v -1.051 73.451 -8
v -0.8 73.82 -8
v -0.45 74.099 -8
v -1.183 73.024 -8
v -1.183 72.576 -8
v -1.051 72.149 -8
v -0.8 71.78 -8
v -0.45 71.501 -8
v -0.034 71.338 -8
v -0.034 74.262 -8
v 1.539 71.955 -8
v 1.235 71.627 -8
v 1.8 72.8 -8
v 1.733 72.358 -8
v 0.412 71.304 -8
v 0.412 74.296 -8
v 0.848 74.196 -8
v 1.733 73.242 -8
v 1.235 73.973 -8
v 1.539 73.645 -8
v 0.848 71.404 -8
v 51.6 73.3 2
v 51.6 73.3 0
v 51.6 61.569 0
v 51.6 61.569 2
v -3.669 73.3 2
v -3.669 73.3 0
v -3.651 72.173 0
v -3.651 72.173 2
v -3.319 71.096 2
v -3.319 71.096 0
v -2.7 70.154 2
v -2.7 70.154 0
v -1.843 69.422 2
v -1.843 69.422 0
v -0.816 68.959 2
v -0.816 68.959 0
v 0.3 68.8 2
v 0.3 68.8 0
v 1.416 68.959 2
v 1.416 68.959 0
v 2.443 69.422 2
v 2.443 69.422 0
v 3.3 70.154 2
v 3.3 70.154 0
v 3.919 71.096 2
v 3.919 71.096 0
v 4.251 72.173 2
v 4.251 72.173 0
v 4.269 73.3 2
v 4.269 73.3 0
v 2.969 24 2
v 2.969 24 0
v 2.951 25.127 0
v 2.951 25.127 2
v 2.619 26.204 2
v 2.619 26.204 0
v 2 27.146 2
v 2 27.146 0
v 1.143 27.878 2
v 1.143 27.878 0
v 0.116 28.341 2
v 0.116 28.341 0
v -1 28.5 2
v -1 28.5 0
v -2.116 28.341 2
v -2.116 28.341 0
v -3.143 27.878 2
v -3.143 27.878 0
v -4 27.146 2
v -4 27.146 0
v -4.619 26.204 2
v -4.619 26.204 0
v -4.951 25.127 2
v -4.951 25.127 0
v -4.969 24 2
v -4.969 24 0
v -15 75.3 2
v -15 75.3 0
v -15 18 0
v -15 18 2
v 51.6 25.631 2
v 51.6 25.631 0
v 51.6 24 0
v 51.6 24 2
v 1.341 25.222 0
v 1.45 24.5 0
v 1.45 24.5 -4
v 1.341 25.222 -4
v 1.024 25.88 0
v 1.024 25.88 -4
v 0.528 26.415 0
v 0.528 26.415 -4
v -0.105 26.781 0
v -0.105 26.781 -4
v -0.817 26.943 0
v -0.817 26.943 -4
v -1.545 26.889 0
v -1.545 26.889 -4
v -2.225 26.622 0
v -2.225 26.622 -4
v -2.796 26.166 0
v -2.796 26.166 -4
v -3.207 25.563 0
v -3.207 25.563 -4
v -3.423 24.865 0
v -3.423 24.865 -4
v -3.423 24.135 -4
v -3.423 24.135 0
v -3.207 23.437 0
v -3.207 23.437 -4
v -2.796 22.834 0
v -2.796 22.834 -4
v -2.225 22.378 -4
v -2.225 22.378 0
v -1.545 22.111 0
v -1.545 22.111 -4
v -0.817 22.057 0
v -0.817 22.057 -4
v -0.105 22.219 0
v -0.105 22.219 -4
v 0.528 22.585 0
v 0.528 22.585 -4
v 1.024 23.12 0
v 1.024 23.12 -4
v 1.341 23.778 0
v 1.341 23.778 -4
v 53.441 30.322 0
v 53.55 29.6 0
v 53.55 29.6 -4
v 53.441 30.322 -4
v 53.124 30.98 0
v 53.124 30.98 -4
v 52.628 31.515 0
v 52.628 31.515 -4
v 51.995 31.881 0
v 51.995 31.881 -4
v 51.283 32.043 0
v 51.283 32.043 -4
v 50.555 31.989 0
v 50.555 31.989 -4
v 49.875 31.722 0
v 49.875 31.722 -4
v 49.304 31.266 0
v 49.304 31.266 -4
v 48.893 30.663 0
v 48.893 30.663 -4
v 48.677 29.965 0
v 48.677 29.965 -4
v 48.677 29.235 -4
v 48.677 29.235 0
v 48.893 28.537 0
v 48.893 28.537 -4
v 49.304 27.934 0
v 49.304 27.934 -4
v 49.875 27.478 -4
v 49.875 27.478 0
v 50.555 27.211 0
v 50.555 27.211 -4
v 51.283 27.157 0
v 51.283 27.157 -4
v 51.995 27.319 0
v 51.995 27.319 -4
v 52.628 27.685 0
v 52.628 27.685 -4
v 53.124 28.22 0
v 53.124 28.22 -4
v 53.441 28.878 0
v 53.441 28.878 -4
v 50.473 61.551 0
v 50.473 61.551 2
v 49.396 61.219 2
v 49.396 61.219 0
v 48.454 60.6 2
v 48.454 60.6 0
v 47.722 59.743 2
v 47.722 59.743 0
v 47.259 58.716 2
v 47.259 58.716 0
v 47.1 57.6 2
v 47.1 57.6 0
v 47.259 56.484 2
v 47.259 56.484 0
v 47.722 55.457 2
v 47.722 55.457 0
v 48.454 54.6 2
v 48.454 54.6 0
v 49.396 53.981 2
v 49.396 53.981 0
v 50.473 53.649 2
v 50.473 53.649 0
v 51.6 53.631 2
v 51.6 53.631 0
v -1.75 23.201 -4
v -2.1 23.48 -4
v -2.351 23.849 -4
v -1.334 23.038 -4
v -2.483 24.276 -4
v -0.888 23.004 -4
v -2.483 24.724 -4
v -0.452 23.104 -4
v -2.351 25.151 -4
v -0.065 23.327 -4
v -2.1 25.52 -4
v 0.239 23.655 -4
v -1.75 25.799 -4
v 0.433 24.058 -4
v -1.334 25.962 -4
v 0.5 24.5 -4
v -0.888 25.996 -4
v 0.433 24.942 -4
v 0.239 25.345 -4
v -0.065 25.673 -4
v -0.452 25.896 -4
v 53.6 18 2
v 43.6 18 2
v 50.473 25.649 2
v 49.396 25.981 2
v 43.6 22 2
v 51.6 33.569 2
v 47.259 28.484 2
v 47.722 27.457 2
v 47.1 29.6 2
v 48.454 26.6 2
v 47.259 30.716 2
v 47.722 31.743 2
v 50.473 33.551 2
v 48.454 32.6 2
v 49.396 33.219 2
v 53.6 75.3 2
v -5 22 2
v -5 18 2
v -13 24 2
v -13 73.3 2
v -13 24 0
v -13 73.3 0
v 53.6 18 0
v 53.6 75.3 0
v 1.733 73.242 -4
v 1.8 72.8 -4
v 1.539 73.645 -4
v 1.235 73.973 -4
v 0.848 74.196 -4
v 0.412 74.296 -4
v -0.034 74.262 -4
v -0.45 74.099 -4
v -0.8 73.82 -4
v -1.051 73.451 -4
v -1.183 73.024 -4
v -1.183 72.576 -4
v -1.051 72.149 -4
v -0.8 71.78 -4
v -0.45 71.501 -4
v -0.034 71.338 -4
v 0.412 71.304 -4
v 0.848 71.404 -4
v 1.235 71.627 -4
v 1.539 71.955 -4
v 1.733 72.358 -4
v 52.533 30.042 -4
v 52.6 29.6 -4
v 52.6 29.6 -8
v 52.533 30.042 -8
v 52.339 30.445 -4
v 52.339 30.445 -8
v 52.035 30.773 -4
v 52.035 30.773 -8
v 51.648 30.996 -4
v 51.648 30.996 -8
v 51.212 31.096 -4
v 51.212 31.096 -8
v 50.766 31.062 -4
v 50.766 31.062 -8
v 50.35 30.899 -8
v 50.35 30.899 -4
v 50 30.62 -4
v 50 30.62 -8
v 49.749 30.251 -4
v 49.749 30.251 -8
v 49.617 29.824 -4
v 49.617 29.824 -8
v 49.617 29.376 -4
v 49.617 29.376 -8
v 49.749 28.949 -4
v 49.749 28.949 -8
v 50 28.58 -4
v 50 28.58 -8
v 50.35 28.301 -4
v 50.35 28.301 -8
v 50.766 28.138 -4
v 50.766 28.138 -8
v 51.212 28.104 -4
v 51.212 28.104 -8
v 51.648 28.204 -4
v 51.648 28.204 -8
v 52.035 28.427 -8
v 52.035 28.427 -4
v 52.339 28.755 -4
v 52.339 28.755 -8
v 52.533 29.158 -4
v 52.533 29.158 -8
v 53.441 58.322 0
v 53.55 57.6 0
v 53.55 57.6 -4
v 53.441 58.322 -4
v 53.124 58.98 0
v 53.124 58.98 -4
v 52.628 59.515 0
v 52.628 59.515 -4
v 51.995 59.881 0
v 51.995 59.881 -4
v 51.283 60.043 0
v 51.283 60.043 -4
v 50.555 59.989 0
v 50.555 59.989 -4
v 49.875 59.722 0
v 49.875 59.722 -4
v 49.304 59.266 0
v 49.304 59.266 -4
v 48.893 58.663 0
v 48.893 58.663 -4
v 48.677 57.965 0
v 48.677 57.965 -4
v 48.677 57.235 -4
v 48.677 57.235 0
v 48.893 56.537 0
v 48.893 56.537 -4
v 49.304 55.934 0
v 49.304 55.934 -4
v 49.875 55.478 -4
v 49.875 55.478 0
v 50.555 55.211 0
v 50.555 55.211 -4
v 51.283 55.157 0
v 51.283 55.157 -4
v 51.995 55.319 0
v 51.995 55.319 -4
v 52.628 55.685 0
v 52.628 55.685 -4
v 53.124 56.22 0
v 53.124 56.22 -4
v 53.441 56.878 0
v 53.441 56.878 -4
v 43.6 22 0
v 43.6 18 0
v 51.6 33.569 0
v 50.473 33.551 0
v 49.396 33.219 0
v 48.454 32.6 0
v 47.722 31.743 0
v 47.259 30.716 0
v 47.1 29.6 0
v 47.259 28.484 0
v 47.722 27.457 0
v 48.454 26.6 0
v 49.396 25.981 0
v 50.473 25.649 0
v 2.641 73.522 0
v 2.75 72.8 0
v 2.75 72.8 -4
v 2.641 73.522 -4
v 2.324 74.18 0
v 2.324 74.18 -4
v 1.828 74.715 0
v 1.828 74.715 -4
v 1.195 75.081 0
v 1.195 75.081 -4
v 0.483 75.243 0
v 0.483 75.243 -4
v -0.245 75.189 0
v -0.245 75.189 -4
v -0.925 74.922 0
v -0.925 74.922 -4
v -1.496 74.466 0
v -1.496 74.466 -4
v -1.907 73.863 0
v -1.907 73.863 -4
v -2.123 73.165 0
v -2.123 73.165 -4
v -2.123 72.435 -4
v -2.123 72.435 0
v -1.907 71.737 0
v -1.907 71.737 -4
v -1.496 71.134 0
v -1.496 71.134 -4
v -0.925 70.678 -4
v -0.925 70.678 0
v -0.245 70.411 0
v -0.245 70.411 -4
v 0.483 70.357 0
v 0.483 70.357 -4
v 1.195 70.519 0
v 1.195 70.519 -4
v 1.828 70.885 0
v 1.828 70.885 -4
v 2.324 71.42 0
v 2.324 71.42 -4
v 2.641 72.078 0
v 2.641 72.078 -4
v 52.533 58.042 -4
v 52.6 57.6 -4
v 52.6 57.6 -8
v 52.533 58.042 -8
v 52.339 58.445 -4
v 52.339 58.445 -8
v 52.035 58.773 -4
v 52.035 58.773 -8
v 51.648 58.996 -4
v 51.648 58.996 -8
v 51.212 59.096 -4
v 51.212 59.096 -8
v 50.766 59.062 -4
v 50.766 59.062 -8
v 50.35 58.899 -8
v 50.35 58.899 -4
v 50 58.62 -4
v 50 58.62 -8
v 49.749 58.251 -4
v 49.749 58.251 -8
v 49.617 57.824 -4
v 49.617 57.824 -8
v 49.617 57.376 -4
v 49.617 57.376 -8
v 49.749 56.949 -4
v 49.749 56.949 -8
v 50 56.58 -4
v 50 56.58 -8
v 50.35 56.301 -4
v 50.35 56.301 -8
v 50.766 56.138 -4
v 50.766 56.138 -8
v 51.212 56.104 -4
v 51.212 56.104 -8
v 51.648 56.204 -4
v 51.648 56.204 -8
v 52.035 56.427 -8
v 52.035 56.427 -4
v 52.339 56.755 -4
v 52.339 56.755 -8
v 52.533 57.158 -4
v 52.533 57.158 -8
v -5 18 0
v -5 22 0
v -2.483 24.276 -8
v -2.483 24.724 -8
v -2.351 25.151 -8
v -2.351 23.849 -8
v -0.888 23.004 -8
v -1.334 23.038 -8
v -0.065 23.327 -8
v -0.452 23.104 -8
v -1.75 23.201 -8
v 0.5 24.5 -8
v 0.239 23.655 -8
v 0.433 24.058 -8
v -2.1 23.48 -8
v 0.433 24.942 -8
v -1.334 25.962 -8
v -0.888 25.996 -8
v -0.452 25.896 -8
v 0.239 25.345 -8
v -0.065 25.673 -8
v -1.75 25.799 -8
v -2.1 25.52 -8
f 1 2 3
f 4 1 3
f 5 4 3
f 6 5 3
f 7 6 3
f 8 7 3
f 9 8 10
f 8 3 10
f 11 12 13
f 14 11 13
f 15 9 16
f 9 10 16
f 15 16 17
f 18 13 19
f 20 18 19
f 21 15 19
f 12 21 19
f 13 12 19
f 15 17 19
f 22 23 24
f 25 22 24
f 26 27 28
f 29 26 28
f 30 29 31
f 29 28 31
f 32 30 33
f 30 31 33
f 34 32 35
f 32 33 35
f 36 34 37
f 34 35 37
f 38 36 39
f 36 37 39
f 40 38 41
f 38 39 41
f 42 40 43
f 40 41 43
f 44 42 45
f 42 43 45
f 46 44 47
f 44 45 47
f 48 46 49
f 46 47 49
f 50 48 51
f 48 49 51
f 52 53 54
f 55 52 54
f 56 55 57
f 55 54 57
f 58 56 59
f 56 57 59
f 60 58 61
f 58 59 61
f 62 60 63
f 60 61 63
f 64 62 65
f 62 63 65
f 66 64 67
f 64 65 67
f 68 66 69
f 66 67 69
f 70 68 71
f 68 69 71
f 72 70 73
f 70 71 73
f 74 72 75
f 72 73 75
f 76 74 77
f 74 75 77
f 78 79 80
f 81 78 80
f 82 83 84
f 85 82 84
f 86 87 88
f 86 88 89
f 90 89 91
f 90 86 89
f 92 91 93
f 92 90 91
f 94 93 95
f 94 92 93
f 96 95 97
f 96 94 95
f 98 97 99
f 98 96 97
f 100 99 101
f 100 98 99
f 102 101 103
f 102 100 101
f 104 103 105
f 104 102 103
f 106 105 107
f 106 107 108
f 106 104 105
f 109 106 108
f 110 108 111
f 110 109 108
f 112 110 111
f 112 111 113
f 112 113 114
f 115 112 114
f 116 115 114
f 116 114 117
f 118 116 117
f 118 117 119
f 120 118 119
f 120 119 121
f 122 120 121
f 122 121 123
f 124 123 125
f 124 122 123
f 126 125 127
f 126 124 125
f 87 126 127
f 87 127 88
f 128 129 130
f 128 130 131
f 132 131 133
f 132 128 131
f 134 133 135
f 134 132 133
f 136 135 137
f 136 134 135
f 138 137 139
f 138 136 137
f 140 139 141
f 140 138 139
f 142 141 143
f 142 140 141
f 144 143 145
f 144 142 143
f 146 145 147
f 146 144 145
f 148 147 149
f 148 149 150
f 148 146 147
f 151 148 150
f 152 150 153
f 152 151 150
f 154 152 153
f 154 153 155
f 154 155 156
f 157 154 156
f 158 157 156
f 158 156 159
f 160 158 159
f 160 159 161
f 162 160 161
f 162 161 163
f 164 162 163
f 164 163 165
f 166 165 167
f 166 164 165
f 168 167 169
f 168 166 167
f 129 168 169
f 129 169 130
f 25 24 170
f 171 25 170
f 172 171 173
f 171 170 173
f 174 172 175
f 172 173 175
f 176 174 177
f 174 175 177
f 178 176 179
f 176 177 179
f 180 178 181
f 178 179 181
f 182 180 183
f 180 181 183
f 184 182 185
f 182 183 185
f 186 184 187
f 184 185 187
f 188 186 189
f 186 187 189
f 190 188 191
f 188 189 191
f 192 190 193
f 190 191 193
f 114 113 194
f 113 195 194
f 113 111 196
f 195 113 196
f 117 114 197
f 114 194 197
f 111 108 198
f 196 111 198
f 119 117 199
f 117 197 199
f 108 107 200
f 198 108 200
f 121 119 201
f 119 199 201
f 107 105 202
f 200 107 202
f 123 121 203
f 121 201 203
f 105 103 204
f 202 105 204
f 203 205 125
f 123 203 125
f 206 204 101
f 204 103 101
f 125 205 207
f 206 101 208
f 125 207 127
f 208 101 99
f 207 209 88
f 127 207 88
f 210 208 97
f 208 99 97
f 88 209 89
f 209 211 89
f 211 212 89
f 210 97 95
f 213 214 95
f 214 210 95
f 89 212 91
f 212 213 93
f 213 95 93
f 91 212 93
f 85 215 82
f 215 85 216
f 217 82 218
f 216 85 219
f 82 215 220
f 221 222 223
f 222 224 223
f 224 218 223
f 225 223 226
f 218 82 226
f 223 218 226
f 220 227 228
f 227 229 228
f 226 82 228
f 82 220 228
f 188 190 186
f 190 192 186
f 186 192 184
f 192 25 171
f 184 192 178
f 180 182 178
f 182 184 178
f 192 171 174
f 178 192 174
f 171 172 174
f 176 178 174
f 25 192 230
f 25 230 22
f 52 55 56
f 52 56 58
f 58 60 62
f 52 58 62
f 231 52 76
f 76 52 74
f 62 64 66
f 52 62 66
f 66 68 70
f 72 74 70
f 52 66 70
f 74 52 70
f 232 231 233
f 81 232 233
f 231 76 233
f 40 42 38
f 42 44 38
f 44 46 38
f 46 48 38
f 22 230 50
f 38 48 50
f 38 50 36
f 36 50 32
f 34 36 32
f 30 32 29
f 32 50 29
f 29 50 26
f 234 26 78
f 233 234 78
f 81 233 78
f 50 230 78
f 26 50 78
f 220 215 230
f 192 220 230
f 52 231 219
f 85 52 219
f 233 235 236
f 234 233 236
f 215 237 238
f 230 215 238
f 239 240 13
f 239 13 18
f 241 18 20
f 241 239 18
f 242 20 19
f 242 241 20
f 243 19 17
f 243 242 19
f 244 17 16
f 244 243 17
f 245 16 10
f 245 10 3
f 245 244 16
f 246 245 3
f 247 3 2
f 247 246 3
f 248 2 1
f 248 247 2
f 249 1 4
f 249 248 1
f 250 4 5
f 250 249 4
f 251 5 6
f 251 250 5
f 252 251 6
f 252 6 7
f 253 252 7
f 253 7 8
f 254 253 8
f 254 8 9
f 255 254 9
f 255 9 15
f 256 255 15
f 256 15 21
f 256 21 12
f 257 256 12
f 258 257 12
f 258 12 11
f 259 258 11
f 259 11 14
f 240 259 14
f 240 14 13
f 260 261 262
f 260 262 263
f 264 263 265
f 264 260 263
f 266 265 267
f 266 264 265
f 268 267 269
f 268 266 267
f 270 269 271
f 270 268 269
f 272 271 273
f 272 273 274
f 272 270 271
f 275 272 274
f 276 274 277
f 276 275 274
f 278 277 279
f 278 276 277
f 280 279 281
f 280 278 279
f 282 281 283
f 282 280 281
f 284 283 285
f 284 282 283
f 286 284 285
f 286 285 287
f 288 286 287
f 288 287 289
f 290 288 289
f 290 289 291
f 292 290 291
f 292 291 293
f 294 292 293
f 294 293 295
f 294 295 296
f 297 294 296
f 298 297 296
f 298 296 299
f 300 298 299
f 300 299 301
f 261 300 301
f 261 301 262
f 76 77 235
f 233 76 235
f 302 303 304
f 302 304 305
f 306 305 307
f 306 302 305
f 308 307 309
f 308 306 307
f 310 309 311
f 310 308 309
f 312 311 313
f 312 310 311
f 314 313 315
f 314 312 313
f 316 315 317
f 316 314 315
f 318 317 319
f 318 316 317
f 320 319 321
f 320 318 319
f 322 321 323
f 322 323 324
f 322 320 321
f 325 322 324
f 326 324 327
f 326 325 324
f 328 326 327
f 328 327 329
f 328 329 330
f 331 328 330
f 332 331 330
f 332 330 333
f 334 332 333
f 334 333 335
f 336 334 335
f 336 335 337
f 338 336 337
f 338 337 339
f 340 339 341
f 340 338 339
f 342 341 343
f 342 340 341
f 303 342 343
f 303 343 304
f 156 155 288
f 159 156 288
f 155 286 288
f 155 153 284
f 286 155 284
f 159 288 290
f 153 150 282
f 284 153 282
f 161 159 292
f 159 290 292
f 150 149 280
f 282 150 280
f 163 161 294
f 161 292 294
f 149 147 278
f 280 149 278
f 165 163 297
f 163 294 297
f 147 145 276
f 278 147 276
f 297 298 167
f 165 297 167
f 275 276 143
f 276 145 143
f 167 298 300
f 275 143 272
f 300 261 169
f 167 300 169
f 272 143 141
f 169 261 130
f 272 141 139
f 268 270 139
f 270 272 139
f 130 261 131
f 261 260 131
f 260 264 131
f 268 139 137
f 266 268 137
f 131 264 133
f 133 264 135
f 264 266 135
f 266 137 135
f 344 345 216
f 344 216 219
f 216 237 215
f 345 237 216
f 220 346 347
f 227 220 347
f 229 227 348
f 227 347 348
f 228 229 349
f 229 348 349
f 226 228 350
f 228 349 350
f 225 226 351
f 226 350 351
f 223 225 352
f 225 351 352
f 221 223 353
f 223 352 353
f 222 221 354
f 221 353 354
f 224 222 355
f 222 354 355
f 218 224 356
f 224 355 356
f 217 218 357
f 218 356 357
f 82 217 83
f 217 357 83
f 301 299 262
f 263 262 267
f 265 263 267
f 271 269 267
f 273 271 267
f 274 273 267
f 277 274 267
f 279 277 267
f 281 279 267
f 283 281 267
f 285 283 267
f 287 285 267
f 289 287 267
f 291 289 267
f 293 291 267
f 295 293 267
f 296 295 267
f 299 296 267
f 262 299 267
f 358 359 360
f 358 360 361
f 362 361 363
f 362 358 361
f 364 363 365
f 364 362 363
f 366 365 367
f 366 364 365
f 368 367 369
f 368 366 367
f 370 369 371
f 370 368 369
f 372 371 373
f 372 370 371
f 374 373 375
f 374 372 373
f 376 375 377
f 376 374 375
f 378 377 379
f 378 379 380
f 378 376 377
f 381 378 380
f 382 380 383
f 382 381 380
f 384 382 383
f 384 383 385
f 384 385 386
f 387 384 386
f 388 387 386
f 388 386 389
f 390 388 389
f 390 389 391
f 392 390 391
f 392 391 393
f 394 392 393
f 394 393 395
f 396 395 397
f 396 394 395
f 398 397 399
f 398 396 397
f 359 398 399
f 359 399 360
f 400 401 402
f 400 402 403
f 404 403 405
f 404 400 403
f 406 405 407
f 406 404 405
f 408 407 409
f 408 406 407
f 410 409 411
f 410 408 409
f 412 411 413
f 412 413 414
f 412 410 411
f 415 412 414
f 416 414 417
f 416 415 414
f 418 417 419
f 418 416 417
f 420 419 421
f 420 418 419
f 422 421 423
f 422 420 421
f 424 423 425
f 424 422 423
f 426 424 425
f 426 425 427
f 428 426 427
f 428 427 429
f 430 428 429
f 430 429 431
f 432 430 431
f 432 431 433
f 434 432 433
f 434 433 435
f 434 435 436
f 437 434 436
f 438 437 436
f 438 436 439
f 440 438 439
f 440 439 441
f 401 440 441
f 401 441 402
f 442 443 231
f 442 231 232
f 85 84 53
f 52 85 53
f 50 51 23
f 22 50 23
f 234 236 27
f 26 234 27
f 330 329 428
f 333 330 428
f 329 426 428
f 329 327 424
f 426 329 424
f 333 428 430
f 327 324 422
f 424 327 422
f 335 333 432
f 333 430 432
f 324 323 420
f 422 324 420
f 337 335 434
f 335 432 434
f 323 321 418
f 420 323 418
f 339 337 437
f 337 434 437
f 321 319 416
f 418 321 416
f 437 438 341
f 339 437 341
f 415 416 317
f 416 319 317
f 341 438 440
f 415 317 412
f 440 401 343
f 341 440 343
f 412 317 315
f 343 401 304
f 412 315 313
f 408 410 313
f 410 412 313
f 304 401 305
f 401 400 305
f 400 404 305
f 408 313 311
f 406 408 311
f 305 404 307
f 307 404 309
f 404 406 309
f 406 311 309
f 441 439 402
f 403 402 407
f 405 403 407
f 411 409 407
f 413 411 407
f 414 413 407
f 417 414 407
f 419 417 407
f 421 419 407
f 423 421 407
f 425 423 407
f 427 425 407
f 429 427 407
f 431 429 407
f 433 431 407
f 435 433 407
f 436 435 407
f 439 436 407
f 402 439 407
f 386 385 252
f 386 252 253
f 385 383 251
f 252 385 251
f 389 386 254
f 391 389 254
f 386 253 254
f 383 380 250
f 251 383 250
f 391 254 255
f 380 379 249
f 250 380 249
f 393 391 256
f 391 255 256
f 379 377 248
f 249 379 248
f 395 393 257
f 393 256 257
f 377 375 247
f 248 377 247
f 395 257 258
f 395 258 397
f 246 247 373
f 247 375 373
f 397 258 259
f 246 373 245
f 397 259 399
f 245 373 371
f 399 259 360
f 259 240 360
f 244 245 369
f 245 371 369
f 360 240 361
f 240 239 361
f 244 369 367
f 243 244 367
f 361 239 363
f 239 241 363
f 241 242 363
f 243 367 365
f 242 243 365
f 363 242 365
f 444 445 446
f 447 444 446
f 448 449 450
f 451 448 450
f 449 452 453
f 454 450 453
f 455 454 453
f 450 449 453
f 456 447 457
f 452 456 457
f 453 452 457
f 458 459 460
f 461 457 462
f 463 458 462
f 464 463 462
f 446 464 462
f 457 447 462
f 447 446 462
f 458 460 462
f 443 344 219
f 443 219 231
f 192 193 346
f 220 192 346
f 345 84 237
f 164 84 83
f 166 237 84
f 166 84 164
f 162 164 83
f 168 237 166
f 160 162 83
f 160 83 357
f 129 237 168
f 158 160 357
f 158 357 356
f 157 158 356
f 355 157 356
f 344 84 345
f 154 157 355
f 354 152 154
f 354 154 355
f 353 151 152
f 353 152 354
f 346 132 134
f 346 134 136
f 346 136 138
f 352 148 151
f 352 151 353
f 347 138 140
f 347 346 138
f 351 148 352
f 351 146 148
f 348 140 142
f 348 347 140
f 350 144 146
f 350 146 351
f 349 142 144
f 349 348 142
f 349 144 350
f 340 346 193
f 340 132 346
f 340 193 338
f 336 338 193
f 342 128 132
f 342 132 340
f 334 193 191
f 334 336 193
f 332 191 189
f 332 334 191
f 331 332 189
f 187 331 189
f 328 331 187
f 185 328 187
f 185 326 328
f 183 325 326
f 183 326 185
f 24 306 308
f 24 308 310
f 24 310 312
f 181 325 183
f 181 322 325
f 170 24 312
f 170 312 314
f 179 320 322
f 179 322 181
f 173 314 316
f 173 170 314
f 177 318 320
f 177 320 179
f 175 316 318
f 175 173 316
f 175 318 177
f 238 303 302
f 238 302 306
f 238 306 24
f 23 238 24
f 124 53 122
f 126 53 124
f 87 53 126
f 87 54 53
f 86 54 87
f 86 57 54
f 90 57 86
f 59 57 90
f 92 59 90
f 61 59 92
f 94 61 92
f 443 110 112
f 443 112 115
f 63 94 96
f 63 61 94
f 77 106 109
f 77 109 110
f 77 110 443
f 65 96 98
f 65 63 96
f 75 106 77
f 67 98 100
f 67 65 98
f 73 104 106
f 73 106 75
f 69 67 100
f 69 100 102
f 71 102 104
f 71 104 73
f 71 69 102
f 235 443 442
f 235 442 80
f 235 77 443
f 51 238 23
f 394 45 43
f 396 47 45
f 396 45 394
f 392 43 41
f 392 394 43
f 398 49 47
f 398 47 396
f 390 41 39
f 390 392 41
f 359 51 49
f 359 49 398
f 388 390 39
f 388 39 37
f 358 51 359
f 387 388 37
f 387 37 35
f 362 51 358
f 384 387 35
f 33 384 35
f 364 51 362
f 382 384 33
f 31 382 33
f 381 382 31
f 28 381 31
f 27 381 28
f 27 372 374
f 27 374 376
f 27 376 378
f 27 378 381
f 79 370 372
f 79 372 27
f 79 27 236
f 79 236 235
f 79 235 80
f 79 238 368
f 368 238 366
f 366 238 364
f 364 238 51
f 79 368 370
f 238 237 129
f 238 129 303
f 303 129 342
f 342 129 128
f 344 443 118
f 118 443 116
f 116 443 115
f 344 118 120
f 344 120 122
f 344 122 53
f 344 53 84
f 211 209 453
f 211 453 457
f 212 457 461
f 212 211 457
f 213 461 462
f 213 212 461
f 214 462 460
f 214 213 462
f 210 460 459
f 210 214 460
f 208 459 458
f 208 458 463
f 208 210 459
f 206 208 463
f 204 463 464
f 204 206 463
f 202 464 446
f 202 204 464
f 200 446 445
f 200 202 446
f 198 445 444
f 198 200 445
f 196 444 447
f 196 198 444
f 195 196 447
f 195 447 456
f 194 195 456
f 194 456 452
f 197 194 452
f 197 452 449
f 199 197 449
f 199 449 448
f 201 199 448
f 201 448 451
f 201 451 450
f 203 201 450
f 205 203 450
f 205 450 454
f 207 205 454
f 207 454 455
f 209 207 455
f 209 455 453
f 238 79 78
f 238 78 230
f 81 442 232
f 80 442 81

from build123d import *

# Parameters (mm, degrees)
PAD003_DEPTH = 2
SKETCH014_R  = 1.5
PAD005_DEPTH = 8
SKETCH015_R  = 2.45
PAD006_DEPTH = 4


with BuildPart() as part:
    # Sketch012 → Pad003 (new body)
    with BuildSketch(Plane.XY):
        Polygon((-15, 75.3), (53.6, 75.3), (53.6, 24.12132), (53.6, 18), (43.6, 18), (43.6, 22), (-5, 22), (-5, 18), (-15, 18), (-15, 22), align=None)
        with BuildLine():
            Line((-13, 73.3), (-3.668627, 73.3))
            ThreePointArc((-3.668627, 73.3), (0.3, 68.8), (4.268627, 73.3))
            Line((4.268627, 73.3), (51.6, 73.3))
            Line((51.6, 73.3), (51.6, 61.568627))
            ThreePointArc((51.6, 61.568627), (47.1, 57.6), (51.6, 53.631373))
            Line((51.6, 53.631373), (51.6, 33.568627))
            ThreePointArc((51.6, 33.568627), (47.1, 29.6), (51.6, 25.631373))
            Line((51.6, 25.631373), (51.6, 24))
            Line((51.6, 24), (2.968627, 24))
            ThreePointArc((2.968627, 24), (-1, 28.5), (-4.968627, 24))
            Line((-4.968627, 24), (-13, 24))
            Line((-13, 24), (-13, 73.3))
        make_face(mode=Mode.SUBTRACT)
    extrude(amount=PAD003_DEPTH)

    # Sketch014 → Pad005 (join)
    with BuildSketch(Plane.XY):
        with Locations((0.3, 72.8)):
            Circle(SKETCH014_R)
        with Locations((51.1, 57.6)):
            Circle(SKETCH014_R)
        with Locations((51.1, 29.6)):
            Circle(SKETCH014_R)
        with Locations((-1, 24.5)):
            Circle(SKETCH014_R)
    extrude(amount=-PAD005_DEPTH)

    # Sketch015 → Pad006 (join)
    with BuildSketch(Plane.XY):
        with Locations((0.3, 72.8)):
            Circle(SKETCH015_R)
        with Locations((51.1, 57.6)):
            Circle(SKETCH015_R)
        with Locations((51.1, 29.6)):
            Circle(SKETCH015_R)
        with Locations((-1, 24.5)):
            Circle(SKETCH015_R)
    extrude(amount=-PAD006_DEPTH)


solid = part.part
